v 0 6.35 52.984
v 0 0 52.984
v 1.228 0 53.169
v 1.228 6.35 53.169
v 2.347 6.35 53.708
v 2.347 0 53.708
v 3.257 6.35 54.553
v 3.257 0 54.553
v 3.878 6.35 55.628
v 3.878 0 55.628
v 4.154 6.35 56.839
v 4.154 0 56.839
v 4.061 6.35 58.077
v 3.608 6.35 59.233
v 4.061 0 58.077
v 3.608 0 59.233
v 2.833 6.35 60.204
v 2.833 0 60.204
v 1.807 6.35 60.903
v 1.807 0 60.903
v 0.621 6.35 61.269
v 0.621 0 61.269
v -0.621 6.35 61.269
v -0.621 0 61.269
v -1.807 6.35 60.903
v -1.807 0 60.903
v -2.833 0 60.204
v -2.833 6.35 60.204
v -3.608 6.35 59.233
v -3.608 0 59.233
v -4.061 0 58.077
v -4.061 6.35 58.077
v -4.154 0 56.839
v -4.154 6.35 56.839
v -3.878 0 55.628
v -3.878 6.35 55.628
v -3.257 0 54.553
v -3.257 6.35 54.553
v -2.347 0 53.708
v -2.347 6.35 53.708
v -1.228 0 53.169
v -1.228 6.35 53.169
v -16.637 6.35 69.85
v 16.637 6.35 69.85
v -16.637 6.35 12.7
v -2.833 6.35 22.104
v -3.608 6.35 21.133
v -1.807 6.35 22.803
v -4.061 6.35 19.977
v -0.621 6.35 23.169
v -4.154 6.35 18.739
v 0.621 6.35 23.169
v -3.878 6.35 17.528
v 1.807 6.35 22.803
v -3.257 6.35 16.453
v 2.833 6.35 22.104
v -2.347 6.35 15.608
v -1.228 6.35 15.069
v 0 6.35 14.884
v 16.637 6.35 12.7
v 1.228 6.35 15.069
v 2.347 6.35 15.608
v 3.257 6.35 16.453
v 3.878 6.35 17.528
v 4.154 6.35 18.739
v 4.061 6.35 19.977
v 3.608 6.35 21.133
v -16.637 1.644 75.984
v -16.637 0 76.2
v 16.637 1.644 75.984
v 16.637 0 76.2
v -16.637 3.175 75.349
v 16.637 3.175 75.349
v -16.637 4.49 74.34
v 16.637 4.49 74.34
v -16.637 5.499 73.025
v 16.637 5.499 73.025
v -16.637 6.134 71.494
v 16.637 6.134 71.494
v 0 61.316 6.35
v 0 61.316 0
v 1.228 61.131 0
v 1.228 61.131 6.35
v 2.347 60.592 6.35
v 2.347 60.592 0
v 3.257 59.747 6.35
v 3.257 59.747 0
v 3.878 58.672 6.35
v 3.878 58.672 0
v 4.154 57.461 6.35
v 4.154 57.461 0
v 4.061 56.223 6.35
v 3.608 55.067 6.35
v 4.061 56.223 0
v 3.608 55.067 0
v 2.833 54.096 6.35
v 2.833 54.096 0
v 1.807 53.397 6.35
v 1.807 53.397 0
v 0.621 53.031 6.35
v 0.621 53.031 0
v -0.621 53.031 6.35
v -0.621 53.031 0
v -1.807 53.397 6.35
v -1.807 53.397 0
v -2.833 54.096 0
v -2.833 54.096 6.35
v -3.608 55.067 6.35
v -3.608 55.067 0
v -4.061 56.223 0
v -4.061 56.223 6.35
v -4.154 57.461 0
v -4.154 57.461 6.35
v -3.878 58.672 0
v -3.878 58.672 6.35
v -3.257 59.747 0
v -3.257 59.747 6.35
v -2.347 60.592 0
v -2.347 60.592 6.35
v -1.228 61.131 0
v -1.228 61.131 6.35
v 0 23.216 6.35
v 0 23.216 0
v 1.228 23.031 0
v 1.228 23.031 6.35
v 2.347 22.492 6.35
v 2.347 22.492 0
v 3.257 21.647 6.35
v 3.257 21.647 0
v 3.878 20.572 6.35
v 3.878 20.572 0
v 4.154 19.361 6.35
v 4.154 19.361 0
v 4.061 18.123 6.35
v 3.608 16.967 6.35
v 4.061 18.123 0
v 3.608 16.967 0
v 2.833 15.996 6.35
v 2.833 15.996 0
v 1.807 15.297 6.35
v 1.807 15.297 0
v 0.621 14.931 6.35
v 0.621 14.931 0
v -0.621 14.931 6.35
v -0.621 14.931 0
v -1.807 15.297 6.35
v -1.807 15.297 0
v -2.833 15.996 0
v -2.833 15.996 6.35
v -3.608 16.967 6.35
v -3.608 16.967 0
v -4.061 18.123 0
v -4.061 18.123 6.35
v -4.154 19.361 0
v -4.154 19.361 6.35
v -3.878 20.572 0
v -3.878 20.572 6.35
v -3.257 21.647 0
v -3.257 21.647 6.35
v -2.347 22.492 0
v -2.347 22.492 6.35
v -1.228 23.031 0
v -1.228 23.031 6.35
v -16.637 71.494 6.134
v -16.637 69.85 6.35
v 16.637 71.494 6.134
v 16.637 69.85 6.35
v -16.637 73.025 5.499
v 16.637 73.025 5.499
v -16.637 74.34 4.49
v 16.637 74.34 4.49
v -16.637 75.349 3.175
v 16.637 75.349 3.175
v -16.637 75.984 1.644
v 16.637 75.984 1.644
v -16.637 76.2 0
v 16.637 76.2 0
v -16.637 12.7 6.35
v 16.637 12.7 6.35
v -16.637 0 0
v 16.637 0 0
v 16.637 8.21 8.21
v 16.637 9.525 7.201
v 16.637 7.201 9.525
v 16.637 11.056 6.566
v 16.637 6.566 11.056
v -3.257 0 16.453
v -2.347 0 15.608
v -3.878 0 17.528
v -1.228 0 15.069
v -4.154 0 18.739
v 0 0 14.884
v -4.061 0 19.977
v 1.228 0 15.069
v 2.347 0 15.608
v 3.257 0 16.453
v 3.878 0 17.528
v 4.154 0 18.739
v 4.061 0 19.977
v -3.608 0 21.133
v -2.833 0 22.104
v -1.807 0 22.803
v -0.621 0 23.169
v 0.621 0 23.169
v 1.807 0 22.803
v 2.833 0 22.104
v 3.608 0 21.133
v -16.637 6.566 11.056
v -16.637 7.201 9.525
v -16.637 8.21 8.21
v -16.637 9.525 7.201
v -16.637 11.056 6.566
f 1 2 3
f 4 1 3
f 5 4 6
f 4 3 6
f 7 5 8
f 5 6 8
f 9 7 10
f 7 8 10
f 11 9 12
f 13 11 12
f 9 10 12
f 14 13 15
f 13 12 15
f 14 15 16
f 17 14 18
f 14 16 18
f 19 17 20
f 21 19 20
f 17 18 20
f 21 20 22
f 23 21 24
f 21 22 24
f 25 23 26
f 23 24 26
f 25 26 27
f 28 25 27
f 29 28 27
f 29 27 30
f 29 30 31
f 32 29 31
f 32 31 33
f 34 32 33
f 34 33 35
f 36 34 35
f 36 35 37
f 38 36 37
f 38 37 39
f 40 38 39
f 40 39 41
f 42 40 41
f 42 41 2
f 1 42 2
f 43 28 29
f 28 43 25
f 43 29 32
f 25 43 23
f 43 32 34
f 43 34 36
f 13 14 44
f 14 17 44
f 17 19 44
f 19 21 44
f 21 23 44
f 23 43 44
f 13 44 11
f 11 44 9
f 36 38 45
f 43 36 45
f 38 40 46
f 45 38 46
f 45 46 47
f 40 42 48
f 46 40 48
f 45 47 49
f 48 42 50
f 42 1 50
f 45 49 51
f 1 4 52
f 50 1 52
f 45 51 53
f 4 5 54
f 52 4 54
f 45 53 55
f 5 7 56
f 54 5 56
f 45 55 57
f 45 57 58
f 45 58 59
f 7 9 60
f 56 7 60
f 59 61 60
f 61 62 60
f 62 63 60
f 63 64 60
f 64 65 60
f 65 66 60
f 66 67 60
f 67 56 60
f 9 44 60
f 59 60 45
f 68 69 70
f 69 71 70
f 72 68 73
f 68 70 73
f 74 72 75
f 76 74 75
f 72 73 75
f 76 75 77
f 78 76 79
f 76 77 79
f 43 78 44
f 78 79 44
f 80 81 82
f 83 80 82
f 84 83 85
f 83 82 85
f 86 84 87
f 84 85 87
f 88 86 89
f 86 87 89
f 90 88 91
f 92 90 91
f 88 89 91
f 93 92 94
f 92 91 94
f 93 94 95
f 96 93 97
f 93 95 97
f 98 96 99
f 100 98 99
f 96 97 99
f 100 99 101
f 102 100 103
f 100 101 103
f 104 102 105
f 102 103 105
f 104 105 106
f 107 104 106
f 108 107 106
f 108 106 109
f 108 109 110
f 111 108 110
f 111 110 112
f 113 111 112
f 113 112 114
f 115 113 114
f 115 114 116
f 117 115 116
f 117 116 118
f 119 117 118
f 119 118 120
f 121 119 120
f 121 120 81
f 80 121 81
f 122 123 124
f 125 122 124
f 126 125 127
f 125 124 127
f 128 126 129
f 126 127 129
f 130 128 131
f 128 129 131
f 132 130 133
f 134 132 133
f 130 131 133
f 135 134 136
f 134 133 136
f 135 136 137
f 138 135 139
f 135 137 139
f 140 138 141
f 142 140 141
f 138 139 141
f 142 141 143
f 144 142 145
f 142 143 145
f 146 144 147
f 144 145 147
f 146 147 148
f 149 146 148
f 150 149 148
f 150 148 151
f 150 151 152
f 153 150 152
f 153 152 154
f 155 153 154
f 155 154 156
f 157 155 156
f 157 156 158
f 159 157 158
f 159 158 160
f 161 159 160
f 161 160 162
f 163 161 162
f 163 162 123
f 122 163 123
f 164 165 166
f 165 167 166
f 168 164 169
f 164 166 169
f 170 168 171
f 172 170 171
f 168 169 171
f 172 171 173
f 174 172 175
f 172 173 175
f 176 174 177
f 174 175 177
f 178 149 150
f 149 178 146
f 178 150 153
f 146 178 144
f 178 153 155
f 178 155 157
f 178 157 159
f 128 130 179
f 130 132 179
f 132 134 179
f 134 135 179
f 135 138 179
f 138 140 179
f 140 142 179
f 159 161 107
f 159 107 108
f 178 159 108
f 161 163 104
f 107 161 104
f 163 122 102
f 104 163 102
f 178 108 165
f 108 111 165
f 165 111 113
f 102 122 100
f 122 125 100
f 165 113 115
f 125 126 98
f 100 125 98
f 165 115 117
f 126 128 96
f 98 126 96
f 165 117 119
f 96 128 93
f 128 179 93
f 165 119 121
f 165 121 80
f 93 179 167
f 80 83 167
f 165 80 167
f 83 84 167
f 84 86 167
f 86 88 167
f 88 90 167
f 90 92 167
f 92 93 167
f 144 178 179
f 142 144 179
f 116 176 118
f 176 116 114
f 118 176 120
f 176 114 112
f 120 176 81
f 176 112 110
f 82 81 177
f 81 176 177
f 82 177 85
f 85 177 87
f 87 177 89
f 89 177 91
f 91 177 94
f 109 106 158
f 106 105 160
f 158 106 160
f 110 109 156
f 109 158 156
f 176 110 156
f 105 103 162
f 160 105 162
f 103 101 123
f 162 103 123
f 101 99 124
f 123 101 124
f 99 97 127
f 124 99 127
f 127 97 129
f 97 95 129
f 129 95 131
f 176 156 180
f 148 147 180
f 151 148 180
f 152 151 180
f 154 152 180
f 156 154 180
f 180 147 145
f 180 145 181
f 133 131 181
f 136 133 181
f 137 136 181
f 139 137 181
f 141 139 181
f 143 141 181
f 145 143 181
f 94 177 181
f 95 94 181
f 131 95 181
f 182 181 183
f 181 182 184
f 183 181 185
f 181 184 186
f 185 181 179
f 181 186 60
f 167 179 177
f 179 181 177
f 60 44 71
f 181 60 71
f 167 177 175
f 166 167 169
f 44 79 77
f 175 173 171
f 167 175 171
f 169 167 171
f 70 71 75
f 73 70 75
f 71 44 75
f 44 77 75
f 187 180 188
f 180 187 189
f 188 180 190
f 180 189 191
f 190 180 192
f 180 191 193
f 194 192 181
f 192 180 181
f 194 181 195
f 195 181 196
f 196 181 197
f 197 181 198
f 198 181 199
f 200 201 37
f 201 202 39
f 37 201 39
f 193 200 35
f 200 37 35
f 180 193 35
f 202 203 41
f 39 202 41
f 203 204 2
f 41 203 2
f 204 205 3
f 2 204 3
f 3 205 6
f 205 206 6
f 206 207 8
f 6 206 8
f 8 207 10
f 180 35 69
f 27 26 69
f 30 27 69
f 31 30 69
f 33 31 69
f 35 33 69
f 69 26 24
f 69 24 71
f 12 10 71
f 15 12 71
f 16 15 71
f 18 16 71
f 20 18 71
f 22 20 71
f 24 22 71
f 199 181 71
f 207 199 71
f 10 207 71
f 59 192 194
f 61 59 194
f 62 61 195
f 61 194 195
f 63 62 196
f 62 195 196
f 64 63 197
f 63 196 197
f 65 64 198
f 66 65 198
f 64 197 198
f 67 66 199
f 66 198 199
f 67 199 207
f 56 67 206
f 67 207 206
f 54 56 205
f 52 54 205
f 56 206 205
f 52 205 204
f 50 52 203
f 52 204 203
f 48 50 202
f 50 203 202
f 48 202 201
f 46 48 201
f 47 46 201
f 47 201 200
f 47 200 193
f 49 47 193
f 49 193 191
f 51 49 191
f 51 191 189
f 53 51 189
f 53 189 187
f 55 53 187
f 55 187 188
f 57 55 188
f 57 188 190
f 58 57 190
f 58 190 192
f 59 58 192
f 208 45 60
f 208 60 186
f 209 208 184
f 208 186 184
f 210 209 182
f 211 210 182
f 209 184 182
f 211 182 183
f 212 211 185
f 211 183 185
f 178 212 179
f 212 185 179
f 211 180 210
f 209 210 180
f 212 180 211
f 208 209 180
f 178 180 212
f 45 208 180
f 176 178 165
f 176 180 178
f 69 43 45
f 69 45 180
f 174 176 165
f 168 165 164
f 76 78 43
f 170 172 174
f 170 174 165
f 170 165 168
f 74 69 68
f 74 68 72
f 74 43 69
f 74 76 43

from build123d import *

# Parameters (mm, degrees)
BASE_EXTRUDE_DEPTH       = 16.637
SKETCH2_R                = 4.1656
HOLE1_DEPTH              = 110.03976233
HOLE1_PATTERN_COUNT      = 2
HOLE1_PATTERN_PITCH      = 38.1
HOLE1_PATTERN_COUNT_DIR2 = 2
HOLE1_PATTERN_PITCH_DIR2 = 38.1
SKETCH3_R                = 4.1656
HOLE2_DEPTH              = 110.03976233
HOLE2_PATTERN_COUNT      = 2
HOLE2_PATTERN_PITCH      = 38.1
HOLE2_PATTERN_COUNT_DIR2 = 2
HOLE2_PATTERN_PITCH_DIR2 = 38.1


with BuildPart() as part:
    # Sketch1 → Base Extrude (new, symmetric)
    with BuildSketch(Plane(origin=(0, 0, 0), x_dir=(0, 0, -1), z_dir=(1, 0, 0))):
        with BuildLine():
            Line((-6.35, 12.7), (-6.35, 69.85))
            ThreePointArc((-6.35, 69.85), (-4.490128061, 74.340128061), (0, 76.2))
            Line((0, 76.2), (0, 0))
            Line((0, 0), (-76.2, 0))
            ThreePointArc((-76.2, 0), (-74.340128061, 4.490128061), (-69.85, 6.35))
            Line((-69.85, 6.35), (-12.7, 6.35))
            ThreePointArc((-12.7, 6.35), (-8.209871939, 8.209871939), (-6.35, 12.7))
        make_face()
    extrude(amount=BASE_EXTRUDE_DEPTH, both=True)

    # Sketch2 → Hole1 (cut, through all)
    with BuildSketch(Plane.XZ):
        with Locations(Location((0, 19.05, 0), (0, 0, 270))):
            Circle(SKETCH2_R)
    hole1 = extrude(amount=-HOLE1_DEPTH, mode=Mode.SUBTRACT)

    # Hole1 Pattern: Hole1 2 × 2
    with Locations(*[(i * HOLE1_PATTERN_PITCH, 0, j * HOLE1_PATTERN_PITCH_DIR2) for i in range(HOLE1_PATTERN_COUNT) for j in range(HOLE1_PATTERN_COUNT_DIR2) if (i, j) != (0, 0)]):
        add(hole1, mode=Mode.SUBTRACT)

    # Sketch3 → Hole2 (cut, through all)
    with BuildSketch(Plane(origin=(0, 0, 0), x_dir=(-1, 0, 0), z_dir=(0, 0, -1))):
        with Locations(Location((0, 19.05, 0), (0, 0, 90))):
            Circle(SKETCH3_R)
    hole2 = extrude(amount=-HOLE2_DEPTH, mode=Mode.SUBTRACT)

    # Hole2 Pattern: Hole2 2 × 2
    with Locations(*[(i * HOLE2_PATTERN_PITCH, j * HOLE2_PATTERN_PITCH_DIR2, 0) for i in range(HOLE2_PATTERN_COUNT) for j in range(HOLE2_PATTERN_COUNT_DIR2) if (i, j) != (0, 0)]):
        add(hole2, mode=Mode.SUBTRACT)


solid = part.part
